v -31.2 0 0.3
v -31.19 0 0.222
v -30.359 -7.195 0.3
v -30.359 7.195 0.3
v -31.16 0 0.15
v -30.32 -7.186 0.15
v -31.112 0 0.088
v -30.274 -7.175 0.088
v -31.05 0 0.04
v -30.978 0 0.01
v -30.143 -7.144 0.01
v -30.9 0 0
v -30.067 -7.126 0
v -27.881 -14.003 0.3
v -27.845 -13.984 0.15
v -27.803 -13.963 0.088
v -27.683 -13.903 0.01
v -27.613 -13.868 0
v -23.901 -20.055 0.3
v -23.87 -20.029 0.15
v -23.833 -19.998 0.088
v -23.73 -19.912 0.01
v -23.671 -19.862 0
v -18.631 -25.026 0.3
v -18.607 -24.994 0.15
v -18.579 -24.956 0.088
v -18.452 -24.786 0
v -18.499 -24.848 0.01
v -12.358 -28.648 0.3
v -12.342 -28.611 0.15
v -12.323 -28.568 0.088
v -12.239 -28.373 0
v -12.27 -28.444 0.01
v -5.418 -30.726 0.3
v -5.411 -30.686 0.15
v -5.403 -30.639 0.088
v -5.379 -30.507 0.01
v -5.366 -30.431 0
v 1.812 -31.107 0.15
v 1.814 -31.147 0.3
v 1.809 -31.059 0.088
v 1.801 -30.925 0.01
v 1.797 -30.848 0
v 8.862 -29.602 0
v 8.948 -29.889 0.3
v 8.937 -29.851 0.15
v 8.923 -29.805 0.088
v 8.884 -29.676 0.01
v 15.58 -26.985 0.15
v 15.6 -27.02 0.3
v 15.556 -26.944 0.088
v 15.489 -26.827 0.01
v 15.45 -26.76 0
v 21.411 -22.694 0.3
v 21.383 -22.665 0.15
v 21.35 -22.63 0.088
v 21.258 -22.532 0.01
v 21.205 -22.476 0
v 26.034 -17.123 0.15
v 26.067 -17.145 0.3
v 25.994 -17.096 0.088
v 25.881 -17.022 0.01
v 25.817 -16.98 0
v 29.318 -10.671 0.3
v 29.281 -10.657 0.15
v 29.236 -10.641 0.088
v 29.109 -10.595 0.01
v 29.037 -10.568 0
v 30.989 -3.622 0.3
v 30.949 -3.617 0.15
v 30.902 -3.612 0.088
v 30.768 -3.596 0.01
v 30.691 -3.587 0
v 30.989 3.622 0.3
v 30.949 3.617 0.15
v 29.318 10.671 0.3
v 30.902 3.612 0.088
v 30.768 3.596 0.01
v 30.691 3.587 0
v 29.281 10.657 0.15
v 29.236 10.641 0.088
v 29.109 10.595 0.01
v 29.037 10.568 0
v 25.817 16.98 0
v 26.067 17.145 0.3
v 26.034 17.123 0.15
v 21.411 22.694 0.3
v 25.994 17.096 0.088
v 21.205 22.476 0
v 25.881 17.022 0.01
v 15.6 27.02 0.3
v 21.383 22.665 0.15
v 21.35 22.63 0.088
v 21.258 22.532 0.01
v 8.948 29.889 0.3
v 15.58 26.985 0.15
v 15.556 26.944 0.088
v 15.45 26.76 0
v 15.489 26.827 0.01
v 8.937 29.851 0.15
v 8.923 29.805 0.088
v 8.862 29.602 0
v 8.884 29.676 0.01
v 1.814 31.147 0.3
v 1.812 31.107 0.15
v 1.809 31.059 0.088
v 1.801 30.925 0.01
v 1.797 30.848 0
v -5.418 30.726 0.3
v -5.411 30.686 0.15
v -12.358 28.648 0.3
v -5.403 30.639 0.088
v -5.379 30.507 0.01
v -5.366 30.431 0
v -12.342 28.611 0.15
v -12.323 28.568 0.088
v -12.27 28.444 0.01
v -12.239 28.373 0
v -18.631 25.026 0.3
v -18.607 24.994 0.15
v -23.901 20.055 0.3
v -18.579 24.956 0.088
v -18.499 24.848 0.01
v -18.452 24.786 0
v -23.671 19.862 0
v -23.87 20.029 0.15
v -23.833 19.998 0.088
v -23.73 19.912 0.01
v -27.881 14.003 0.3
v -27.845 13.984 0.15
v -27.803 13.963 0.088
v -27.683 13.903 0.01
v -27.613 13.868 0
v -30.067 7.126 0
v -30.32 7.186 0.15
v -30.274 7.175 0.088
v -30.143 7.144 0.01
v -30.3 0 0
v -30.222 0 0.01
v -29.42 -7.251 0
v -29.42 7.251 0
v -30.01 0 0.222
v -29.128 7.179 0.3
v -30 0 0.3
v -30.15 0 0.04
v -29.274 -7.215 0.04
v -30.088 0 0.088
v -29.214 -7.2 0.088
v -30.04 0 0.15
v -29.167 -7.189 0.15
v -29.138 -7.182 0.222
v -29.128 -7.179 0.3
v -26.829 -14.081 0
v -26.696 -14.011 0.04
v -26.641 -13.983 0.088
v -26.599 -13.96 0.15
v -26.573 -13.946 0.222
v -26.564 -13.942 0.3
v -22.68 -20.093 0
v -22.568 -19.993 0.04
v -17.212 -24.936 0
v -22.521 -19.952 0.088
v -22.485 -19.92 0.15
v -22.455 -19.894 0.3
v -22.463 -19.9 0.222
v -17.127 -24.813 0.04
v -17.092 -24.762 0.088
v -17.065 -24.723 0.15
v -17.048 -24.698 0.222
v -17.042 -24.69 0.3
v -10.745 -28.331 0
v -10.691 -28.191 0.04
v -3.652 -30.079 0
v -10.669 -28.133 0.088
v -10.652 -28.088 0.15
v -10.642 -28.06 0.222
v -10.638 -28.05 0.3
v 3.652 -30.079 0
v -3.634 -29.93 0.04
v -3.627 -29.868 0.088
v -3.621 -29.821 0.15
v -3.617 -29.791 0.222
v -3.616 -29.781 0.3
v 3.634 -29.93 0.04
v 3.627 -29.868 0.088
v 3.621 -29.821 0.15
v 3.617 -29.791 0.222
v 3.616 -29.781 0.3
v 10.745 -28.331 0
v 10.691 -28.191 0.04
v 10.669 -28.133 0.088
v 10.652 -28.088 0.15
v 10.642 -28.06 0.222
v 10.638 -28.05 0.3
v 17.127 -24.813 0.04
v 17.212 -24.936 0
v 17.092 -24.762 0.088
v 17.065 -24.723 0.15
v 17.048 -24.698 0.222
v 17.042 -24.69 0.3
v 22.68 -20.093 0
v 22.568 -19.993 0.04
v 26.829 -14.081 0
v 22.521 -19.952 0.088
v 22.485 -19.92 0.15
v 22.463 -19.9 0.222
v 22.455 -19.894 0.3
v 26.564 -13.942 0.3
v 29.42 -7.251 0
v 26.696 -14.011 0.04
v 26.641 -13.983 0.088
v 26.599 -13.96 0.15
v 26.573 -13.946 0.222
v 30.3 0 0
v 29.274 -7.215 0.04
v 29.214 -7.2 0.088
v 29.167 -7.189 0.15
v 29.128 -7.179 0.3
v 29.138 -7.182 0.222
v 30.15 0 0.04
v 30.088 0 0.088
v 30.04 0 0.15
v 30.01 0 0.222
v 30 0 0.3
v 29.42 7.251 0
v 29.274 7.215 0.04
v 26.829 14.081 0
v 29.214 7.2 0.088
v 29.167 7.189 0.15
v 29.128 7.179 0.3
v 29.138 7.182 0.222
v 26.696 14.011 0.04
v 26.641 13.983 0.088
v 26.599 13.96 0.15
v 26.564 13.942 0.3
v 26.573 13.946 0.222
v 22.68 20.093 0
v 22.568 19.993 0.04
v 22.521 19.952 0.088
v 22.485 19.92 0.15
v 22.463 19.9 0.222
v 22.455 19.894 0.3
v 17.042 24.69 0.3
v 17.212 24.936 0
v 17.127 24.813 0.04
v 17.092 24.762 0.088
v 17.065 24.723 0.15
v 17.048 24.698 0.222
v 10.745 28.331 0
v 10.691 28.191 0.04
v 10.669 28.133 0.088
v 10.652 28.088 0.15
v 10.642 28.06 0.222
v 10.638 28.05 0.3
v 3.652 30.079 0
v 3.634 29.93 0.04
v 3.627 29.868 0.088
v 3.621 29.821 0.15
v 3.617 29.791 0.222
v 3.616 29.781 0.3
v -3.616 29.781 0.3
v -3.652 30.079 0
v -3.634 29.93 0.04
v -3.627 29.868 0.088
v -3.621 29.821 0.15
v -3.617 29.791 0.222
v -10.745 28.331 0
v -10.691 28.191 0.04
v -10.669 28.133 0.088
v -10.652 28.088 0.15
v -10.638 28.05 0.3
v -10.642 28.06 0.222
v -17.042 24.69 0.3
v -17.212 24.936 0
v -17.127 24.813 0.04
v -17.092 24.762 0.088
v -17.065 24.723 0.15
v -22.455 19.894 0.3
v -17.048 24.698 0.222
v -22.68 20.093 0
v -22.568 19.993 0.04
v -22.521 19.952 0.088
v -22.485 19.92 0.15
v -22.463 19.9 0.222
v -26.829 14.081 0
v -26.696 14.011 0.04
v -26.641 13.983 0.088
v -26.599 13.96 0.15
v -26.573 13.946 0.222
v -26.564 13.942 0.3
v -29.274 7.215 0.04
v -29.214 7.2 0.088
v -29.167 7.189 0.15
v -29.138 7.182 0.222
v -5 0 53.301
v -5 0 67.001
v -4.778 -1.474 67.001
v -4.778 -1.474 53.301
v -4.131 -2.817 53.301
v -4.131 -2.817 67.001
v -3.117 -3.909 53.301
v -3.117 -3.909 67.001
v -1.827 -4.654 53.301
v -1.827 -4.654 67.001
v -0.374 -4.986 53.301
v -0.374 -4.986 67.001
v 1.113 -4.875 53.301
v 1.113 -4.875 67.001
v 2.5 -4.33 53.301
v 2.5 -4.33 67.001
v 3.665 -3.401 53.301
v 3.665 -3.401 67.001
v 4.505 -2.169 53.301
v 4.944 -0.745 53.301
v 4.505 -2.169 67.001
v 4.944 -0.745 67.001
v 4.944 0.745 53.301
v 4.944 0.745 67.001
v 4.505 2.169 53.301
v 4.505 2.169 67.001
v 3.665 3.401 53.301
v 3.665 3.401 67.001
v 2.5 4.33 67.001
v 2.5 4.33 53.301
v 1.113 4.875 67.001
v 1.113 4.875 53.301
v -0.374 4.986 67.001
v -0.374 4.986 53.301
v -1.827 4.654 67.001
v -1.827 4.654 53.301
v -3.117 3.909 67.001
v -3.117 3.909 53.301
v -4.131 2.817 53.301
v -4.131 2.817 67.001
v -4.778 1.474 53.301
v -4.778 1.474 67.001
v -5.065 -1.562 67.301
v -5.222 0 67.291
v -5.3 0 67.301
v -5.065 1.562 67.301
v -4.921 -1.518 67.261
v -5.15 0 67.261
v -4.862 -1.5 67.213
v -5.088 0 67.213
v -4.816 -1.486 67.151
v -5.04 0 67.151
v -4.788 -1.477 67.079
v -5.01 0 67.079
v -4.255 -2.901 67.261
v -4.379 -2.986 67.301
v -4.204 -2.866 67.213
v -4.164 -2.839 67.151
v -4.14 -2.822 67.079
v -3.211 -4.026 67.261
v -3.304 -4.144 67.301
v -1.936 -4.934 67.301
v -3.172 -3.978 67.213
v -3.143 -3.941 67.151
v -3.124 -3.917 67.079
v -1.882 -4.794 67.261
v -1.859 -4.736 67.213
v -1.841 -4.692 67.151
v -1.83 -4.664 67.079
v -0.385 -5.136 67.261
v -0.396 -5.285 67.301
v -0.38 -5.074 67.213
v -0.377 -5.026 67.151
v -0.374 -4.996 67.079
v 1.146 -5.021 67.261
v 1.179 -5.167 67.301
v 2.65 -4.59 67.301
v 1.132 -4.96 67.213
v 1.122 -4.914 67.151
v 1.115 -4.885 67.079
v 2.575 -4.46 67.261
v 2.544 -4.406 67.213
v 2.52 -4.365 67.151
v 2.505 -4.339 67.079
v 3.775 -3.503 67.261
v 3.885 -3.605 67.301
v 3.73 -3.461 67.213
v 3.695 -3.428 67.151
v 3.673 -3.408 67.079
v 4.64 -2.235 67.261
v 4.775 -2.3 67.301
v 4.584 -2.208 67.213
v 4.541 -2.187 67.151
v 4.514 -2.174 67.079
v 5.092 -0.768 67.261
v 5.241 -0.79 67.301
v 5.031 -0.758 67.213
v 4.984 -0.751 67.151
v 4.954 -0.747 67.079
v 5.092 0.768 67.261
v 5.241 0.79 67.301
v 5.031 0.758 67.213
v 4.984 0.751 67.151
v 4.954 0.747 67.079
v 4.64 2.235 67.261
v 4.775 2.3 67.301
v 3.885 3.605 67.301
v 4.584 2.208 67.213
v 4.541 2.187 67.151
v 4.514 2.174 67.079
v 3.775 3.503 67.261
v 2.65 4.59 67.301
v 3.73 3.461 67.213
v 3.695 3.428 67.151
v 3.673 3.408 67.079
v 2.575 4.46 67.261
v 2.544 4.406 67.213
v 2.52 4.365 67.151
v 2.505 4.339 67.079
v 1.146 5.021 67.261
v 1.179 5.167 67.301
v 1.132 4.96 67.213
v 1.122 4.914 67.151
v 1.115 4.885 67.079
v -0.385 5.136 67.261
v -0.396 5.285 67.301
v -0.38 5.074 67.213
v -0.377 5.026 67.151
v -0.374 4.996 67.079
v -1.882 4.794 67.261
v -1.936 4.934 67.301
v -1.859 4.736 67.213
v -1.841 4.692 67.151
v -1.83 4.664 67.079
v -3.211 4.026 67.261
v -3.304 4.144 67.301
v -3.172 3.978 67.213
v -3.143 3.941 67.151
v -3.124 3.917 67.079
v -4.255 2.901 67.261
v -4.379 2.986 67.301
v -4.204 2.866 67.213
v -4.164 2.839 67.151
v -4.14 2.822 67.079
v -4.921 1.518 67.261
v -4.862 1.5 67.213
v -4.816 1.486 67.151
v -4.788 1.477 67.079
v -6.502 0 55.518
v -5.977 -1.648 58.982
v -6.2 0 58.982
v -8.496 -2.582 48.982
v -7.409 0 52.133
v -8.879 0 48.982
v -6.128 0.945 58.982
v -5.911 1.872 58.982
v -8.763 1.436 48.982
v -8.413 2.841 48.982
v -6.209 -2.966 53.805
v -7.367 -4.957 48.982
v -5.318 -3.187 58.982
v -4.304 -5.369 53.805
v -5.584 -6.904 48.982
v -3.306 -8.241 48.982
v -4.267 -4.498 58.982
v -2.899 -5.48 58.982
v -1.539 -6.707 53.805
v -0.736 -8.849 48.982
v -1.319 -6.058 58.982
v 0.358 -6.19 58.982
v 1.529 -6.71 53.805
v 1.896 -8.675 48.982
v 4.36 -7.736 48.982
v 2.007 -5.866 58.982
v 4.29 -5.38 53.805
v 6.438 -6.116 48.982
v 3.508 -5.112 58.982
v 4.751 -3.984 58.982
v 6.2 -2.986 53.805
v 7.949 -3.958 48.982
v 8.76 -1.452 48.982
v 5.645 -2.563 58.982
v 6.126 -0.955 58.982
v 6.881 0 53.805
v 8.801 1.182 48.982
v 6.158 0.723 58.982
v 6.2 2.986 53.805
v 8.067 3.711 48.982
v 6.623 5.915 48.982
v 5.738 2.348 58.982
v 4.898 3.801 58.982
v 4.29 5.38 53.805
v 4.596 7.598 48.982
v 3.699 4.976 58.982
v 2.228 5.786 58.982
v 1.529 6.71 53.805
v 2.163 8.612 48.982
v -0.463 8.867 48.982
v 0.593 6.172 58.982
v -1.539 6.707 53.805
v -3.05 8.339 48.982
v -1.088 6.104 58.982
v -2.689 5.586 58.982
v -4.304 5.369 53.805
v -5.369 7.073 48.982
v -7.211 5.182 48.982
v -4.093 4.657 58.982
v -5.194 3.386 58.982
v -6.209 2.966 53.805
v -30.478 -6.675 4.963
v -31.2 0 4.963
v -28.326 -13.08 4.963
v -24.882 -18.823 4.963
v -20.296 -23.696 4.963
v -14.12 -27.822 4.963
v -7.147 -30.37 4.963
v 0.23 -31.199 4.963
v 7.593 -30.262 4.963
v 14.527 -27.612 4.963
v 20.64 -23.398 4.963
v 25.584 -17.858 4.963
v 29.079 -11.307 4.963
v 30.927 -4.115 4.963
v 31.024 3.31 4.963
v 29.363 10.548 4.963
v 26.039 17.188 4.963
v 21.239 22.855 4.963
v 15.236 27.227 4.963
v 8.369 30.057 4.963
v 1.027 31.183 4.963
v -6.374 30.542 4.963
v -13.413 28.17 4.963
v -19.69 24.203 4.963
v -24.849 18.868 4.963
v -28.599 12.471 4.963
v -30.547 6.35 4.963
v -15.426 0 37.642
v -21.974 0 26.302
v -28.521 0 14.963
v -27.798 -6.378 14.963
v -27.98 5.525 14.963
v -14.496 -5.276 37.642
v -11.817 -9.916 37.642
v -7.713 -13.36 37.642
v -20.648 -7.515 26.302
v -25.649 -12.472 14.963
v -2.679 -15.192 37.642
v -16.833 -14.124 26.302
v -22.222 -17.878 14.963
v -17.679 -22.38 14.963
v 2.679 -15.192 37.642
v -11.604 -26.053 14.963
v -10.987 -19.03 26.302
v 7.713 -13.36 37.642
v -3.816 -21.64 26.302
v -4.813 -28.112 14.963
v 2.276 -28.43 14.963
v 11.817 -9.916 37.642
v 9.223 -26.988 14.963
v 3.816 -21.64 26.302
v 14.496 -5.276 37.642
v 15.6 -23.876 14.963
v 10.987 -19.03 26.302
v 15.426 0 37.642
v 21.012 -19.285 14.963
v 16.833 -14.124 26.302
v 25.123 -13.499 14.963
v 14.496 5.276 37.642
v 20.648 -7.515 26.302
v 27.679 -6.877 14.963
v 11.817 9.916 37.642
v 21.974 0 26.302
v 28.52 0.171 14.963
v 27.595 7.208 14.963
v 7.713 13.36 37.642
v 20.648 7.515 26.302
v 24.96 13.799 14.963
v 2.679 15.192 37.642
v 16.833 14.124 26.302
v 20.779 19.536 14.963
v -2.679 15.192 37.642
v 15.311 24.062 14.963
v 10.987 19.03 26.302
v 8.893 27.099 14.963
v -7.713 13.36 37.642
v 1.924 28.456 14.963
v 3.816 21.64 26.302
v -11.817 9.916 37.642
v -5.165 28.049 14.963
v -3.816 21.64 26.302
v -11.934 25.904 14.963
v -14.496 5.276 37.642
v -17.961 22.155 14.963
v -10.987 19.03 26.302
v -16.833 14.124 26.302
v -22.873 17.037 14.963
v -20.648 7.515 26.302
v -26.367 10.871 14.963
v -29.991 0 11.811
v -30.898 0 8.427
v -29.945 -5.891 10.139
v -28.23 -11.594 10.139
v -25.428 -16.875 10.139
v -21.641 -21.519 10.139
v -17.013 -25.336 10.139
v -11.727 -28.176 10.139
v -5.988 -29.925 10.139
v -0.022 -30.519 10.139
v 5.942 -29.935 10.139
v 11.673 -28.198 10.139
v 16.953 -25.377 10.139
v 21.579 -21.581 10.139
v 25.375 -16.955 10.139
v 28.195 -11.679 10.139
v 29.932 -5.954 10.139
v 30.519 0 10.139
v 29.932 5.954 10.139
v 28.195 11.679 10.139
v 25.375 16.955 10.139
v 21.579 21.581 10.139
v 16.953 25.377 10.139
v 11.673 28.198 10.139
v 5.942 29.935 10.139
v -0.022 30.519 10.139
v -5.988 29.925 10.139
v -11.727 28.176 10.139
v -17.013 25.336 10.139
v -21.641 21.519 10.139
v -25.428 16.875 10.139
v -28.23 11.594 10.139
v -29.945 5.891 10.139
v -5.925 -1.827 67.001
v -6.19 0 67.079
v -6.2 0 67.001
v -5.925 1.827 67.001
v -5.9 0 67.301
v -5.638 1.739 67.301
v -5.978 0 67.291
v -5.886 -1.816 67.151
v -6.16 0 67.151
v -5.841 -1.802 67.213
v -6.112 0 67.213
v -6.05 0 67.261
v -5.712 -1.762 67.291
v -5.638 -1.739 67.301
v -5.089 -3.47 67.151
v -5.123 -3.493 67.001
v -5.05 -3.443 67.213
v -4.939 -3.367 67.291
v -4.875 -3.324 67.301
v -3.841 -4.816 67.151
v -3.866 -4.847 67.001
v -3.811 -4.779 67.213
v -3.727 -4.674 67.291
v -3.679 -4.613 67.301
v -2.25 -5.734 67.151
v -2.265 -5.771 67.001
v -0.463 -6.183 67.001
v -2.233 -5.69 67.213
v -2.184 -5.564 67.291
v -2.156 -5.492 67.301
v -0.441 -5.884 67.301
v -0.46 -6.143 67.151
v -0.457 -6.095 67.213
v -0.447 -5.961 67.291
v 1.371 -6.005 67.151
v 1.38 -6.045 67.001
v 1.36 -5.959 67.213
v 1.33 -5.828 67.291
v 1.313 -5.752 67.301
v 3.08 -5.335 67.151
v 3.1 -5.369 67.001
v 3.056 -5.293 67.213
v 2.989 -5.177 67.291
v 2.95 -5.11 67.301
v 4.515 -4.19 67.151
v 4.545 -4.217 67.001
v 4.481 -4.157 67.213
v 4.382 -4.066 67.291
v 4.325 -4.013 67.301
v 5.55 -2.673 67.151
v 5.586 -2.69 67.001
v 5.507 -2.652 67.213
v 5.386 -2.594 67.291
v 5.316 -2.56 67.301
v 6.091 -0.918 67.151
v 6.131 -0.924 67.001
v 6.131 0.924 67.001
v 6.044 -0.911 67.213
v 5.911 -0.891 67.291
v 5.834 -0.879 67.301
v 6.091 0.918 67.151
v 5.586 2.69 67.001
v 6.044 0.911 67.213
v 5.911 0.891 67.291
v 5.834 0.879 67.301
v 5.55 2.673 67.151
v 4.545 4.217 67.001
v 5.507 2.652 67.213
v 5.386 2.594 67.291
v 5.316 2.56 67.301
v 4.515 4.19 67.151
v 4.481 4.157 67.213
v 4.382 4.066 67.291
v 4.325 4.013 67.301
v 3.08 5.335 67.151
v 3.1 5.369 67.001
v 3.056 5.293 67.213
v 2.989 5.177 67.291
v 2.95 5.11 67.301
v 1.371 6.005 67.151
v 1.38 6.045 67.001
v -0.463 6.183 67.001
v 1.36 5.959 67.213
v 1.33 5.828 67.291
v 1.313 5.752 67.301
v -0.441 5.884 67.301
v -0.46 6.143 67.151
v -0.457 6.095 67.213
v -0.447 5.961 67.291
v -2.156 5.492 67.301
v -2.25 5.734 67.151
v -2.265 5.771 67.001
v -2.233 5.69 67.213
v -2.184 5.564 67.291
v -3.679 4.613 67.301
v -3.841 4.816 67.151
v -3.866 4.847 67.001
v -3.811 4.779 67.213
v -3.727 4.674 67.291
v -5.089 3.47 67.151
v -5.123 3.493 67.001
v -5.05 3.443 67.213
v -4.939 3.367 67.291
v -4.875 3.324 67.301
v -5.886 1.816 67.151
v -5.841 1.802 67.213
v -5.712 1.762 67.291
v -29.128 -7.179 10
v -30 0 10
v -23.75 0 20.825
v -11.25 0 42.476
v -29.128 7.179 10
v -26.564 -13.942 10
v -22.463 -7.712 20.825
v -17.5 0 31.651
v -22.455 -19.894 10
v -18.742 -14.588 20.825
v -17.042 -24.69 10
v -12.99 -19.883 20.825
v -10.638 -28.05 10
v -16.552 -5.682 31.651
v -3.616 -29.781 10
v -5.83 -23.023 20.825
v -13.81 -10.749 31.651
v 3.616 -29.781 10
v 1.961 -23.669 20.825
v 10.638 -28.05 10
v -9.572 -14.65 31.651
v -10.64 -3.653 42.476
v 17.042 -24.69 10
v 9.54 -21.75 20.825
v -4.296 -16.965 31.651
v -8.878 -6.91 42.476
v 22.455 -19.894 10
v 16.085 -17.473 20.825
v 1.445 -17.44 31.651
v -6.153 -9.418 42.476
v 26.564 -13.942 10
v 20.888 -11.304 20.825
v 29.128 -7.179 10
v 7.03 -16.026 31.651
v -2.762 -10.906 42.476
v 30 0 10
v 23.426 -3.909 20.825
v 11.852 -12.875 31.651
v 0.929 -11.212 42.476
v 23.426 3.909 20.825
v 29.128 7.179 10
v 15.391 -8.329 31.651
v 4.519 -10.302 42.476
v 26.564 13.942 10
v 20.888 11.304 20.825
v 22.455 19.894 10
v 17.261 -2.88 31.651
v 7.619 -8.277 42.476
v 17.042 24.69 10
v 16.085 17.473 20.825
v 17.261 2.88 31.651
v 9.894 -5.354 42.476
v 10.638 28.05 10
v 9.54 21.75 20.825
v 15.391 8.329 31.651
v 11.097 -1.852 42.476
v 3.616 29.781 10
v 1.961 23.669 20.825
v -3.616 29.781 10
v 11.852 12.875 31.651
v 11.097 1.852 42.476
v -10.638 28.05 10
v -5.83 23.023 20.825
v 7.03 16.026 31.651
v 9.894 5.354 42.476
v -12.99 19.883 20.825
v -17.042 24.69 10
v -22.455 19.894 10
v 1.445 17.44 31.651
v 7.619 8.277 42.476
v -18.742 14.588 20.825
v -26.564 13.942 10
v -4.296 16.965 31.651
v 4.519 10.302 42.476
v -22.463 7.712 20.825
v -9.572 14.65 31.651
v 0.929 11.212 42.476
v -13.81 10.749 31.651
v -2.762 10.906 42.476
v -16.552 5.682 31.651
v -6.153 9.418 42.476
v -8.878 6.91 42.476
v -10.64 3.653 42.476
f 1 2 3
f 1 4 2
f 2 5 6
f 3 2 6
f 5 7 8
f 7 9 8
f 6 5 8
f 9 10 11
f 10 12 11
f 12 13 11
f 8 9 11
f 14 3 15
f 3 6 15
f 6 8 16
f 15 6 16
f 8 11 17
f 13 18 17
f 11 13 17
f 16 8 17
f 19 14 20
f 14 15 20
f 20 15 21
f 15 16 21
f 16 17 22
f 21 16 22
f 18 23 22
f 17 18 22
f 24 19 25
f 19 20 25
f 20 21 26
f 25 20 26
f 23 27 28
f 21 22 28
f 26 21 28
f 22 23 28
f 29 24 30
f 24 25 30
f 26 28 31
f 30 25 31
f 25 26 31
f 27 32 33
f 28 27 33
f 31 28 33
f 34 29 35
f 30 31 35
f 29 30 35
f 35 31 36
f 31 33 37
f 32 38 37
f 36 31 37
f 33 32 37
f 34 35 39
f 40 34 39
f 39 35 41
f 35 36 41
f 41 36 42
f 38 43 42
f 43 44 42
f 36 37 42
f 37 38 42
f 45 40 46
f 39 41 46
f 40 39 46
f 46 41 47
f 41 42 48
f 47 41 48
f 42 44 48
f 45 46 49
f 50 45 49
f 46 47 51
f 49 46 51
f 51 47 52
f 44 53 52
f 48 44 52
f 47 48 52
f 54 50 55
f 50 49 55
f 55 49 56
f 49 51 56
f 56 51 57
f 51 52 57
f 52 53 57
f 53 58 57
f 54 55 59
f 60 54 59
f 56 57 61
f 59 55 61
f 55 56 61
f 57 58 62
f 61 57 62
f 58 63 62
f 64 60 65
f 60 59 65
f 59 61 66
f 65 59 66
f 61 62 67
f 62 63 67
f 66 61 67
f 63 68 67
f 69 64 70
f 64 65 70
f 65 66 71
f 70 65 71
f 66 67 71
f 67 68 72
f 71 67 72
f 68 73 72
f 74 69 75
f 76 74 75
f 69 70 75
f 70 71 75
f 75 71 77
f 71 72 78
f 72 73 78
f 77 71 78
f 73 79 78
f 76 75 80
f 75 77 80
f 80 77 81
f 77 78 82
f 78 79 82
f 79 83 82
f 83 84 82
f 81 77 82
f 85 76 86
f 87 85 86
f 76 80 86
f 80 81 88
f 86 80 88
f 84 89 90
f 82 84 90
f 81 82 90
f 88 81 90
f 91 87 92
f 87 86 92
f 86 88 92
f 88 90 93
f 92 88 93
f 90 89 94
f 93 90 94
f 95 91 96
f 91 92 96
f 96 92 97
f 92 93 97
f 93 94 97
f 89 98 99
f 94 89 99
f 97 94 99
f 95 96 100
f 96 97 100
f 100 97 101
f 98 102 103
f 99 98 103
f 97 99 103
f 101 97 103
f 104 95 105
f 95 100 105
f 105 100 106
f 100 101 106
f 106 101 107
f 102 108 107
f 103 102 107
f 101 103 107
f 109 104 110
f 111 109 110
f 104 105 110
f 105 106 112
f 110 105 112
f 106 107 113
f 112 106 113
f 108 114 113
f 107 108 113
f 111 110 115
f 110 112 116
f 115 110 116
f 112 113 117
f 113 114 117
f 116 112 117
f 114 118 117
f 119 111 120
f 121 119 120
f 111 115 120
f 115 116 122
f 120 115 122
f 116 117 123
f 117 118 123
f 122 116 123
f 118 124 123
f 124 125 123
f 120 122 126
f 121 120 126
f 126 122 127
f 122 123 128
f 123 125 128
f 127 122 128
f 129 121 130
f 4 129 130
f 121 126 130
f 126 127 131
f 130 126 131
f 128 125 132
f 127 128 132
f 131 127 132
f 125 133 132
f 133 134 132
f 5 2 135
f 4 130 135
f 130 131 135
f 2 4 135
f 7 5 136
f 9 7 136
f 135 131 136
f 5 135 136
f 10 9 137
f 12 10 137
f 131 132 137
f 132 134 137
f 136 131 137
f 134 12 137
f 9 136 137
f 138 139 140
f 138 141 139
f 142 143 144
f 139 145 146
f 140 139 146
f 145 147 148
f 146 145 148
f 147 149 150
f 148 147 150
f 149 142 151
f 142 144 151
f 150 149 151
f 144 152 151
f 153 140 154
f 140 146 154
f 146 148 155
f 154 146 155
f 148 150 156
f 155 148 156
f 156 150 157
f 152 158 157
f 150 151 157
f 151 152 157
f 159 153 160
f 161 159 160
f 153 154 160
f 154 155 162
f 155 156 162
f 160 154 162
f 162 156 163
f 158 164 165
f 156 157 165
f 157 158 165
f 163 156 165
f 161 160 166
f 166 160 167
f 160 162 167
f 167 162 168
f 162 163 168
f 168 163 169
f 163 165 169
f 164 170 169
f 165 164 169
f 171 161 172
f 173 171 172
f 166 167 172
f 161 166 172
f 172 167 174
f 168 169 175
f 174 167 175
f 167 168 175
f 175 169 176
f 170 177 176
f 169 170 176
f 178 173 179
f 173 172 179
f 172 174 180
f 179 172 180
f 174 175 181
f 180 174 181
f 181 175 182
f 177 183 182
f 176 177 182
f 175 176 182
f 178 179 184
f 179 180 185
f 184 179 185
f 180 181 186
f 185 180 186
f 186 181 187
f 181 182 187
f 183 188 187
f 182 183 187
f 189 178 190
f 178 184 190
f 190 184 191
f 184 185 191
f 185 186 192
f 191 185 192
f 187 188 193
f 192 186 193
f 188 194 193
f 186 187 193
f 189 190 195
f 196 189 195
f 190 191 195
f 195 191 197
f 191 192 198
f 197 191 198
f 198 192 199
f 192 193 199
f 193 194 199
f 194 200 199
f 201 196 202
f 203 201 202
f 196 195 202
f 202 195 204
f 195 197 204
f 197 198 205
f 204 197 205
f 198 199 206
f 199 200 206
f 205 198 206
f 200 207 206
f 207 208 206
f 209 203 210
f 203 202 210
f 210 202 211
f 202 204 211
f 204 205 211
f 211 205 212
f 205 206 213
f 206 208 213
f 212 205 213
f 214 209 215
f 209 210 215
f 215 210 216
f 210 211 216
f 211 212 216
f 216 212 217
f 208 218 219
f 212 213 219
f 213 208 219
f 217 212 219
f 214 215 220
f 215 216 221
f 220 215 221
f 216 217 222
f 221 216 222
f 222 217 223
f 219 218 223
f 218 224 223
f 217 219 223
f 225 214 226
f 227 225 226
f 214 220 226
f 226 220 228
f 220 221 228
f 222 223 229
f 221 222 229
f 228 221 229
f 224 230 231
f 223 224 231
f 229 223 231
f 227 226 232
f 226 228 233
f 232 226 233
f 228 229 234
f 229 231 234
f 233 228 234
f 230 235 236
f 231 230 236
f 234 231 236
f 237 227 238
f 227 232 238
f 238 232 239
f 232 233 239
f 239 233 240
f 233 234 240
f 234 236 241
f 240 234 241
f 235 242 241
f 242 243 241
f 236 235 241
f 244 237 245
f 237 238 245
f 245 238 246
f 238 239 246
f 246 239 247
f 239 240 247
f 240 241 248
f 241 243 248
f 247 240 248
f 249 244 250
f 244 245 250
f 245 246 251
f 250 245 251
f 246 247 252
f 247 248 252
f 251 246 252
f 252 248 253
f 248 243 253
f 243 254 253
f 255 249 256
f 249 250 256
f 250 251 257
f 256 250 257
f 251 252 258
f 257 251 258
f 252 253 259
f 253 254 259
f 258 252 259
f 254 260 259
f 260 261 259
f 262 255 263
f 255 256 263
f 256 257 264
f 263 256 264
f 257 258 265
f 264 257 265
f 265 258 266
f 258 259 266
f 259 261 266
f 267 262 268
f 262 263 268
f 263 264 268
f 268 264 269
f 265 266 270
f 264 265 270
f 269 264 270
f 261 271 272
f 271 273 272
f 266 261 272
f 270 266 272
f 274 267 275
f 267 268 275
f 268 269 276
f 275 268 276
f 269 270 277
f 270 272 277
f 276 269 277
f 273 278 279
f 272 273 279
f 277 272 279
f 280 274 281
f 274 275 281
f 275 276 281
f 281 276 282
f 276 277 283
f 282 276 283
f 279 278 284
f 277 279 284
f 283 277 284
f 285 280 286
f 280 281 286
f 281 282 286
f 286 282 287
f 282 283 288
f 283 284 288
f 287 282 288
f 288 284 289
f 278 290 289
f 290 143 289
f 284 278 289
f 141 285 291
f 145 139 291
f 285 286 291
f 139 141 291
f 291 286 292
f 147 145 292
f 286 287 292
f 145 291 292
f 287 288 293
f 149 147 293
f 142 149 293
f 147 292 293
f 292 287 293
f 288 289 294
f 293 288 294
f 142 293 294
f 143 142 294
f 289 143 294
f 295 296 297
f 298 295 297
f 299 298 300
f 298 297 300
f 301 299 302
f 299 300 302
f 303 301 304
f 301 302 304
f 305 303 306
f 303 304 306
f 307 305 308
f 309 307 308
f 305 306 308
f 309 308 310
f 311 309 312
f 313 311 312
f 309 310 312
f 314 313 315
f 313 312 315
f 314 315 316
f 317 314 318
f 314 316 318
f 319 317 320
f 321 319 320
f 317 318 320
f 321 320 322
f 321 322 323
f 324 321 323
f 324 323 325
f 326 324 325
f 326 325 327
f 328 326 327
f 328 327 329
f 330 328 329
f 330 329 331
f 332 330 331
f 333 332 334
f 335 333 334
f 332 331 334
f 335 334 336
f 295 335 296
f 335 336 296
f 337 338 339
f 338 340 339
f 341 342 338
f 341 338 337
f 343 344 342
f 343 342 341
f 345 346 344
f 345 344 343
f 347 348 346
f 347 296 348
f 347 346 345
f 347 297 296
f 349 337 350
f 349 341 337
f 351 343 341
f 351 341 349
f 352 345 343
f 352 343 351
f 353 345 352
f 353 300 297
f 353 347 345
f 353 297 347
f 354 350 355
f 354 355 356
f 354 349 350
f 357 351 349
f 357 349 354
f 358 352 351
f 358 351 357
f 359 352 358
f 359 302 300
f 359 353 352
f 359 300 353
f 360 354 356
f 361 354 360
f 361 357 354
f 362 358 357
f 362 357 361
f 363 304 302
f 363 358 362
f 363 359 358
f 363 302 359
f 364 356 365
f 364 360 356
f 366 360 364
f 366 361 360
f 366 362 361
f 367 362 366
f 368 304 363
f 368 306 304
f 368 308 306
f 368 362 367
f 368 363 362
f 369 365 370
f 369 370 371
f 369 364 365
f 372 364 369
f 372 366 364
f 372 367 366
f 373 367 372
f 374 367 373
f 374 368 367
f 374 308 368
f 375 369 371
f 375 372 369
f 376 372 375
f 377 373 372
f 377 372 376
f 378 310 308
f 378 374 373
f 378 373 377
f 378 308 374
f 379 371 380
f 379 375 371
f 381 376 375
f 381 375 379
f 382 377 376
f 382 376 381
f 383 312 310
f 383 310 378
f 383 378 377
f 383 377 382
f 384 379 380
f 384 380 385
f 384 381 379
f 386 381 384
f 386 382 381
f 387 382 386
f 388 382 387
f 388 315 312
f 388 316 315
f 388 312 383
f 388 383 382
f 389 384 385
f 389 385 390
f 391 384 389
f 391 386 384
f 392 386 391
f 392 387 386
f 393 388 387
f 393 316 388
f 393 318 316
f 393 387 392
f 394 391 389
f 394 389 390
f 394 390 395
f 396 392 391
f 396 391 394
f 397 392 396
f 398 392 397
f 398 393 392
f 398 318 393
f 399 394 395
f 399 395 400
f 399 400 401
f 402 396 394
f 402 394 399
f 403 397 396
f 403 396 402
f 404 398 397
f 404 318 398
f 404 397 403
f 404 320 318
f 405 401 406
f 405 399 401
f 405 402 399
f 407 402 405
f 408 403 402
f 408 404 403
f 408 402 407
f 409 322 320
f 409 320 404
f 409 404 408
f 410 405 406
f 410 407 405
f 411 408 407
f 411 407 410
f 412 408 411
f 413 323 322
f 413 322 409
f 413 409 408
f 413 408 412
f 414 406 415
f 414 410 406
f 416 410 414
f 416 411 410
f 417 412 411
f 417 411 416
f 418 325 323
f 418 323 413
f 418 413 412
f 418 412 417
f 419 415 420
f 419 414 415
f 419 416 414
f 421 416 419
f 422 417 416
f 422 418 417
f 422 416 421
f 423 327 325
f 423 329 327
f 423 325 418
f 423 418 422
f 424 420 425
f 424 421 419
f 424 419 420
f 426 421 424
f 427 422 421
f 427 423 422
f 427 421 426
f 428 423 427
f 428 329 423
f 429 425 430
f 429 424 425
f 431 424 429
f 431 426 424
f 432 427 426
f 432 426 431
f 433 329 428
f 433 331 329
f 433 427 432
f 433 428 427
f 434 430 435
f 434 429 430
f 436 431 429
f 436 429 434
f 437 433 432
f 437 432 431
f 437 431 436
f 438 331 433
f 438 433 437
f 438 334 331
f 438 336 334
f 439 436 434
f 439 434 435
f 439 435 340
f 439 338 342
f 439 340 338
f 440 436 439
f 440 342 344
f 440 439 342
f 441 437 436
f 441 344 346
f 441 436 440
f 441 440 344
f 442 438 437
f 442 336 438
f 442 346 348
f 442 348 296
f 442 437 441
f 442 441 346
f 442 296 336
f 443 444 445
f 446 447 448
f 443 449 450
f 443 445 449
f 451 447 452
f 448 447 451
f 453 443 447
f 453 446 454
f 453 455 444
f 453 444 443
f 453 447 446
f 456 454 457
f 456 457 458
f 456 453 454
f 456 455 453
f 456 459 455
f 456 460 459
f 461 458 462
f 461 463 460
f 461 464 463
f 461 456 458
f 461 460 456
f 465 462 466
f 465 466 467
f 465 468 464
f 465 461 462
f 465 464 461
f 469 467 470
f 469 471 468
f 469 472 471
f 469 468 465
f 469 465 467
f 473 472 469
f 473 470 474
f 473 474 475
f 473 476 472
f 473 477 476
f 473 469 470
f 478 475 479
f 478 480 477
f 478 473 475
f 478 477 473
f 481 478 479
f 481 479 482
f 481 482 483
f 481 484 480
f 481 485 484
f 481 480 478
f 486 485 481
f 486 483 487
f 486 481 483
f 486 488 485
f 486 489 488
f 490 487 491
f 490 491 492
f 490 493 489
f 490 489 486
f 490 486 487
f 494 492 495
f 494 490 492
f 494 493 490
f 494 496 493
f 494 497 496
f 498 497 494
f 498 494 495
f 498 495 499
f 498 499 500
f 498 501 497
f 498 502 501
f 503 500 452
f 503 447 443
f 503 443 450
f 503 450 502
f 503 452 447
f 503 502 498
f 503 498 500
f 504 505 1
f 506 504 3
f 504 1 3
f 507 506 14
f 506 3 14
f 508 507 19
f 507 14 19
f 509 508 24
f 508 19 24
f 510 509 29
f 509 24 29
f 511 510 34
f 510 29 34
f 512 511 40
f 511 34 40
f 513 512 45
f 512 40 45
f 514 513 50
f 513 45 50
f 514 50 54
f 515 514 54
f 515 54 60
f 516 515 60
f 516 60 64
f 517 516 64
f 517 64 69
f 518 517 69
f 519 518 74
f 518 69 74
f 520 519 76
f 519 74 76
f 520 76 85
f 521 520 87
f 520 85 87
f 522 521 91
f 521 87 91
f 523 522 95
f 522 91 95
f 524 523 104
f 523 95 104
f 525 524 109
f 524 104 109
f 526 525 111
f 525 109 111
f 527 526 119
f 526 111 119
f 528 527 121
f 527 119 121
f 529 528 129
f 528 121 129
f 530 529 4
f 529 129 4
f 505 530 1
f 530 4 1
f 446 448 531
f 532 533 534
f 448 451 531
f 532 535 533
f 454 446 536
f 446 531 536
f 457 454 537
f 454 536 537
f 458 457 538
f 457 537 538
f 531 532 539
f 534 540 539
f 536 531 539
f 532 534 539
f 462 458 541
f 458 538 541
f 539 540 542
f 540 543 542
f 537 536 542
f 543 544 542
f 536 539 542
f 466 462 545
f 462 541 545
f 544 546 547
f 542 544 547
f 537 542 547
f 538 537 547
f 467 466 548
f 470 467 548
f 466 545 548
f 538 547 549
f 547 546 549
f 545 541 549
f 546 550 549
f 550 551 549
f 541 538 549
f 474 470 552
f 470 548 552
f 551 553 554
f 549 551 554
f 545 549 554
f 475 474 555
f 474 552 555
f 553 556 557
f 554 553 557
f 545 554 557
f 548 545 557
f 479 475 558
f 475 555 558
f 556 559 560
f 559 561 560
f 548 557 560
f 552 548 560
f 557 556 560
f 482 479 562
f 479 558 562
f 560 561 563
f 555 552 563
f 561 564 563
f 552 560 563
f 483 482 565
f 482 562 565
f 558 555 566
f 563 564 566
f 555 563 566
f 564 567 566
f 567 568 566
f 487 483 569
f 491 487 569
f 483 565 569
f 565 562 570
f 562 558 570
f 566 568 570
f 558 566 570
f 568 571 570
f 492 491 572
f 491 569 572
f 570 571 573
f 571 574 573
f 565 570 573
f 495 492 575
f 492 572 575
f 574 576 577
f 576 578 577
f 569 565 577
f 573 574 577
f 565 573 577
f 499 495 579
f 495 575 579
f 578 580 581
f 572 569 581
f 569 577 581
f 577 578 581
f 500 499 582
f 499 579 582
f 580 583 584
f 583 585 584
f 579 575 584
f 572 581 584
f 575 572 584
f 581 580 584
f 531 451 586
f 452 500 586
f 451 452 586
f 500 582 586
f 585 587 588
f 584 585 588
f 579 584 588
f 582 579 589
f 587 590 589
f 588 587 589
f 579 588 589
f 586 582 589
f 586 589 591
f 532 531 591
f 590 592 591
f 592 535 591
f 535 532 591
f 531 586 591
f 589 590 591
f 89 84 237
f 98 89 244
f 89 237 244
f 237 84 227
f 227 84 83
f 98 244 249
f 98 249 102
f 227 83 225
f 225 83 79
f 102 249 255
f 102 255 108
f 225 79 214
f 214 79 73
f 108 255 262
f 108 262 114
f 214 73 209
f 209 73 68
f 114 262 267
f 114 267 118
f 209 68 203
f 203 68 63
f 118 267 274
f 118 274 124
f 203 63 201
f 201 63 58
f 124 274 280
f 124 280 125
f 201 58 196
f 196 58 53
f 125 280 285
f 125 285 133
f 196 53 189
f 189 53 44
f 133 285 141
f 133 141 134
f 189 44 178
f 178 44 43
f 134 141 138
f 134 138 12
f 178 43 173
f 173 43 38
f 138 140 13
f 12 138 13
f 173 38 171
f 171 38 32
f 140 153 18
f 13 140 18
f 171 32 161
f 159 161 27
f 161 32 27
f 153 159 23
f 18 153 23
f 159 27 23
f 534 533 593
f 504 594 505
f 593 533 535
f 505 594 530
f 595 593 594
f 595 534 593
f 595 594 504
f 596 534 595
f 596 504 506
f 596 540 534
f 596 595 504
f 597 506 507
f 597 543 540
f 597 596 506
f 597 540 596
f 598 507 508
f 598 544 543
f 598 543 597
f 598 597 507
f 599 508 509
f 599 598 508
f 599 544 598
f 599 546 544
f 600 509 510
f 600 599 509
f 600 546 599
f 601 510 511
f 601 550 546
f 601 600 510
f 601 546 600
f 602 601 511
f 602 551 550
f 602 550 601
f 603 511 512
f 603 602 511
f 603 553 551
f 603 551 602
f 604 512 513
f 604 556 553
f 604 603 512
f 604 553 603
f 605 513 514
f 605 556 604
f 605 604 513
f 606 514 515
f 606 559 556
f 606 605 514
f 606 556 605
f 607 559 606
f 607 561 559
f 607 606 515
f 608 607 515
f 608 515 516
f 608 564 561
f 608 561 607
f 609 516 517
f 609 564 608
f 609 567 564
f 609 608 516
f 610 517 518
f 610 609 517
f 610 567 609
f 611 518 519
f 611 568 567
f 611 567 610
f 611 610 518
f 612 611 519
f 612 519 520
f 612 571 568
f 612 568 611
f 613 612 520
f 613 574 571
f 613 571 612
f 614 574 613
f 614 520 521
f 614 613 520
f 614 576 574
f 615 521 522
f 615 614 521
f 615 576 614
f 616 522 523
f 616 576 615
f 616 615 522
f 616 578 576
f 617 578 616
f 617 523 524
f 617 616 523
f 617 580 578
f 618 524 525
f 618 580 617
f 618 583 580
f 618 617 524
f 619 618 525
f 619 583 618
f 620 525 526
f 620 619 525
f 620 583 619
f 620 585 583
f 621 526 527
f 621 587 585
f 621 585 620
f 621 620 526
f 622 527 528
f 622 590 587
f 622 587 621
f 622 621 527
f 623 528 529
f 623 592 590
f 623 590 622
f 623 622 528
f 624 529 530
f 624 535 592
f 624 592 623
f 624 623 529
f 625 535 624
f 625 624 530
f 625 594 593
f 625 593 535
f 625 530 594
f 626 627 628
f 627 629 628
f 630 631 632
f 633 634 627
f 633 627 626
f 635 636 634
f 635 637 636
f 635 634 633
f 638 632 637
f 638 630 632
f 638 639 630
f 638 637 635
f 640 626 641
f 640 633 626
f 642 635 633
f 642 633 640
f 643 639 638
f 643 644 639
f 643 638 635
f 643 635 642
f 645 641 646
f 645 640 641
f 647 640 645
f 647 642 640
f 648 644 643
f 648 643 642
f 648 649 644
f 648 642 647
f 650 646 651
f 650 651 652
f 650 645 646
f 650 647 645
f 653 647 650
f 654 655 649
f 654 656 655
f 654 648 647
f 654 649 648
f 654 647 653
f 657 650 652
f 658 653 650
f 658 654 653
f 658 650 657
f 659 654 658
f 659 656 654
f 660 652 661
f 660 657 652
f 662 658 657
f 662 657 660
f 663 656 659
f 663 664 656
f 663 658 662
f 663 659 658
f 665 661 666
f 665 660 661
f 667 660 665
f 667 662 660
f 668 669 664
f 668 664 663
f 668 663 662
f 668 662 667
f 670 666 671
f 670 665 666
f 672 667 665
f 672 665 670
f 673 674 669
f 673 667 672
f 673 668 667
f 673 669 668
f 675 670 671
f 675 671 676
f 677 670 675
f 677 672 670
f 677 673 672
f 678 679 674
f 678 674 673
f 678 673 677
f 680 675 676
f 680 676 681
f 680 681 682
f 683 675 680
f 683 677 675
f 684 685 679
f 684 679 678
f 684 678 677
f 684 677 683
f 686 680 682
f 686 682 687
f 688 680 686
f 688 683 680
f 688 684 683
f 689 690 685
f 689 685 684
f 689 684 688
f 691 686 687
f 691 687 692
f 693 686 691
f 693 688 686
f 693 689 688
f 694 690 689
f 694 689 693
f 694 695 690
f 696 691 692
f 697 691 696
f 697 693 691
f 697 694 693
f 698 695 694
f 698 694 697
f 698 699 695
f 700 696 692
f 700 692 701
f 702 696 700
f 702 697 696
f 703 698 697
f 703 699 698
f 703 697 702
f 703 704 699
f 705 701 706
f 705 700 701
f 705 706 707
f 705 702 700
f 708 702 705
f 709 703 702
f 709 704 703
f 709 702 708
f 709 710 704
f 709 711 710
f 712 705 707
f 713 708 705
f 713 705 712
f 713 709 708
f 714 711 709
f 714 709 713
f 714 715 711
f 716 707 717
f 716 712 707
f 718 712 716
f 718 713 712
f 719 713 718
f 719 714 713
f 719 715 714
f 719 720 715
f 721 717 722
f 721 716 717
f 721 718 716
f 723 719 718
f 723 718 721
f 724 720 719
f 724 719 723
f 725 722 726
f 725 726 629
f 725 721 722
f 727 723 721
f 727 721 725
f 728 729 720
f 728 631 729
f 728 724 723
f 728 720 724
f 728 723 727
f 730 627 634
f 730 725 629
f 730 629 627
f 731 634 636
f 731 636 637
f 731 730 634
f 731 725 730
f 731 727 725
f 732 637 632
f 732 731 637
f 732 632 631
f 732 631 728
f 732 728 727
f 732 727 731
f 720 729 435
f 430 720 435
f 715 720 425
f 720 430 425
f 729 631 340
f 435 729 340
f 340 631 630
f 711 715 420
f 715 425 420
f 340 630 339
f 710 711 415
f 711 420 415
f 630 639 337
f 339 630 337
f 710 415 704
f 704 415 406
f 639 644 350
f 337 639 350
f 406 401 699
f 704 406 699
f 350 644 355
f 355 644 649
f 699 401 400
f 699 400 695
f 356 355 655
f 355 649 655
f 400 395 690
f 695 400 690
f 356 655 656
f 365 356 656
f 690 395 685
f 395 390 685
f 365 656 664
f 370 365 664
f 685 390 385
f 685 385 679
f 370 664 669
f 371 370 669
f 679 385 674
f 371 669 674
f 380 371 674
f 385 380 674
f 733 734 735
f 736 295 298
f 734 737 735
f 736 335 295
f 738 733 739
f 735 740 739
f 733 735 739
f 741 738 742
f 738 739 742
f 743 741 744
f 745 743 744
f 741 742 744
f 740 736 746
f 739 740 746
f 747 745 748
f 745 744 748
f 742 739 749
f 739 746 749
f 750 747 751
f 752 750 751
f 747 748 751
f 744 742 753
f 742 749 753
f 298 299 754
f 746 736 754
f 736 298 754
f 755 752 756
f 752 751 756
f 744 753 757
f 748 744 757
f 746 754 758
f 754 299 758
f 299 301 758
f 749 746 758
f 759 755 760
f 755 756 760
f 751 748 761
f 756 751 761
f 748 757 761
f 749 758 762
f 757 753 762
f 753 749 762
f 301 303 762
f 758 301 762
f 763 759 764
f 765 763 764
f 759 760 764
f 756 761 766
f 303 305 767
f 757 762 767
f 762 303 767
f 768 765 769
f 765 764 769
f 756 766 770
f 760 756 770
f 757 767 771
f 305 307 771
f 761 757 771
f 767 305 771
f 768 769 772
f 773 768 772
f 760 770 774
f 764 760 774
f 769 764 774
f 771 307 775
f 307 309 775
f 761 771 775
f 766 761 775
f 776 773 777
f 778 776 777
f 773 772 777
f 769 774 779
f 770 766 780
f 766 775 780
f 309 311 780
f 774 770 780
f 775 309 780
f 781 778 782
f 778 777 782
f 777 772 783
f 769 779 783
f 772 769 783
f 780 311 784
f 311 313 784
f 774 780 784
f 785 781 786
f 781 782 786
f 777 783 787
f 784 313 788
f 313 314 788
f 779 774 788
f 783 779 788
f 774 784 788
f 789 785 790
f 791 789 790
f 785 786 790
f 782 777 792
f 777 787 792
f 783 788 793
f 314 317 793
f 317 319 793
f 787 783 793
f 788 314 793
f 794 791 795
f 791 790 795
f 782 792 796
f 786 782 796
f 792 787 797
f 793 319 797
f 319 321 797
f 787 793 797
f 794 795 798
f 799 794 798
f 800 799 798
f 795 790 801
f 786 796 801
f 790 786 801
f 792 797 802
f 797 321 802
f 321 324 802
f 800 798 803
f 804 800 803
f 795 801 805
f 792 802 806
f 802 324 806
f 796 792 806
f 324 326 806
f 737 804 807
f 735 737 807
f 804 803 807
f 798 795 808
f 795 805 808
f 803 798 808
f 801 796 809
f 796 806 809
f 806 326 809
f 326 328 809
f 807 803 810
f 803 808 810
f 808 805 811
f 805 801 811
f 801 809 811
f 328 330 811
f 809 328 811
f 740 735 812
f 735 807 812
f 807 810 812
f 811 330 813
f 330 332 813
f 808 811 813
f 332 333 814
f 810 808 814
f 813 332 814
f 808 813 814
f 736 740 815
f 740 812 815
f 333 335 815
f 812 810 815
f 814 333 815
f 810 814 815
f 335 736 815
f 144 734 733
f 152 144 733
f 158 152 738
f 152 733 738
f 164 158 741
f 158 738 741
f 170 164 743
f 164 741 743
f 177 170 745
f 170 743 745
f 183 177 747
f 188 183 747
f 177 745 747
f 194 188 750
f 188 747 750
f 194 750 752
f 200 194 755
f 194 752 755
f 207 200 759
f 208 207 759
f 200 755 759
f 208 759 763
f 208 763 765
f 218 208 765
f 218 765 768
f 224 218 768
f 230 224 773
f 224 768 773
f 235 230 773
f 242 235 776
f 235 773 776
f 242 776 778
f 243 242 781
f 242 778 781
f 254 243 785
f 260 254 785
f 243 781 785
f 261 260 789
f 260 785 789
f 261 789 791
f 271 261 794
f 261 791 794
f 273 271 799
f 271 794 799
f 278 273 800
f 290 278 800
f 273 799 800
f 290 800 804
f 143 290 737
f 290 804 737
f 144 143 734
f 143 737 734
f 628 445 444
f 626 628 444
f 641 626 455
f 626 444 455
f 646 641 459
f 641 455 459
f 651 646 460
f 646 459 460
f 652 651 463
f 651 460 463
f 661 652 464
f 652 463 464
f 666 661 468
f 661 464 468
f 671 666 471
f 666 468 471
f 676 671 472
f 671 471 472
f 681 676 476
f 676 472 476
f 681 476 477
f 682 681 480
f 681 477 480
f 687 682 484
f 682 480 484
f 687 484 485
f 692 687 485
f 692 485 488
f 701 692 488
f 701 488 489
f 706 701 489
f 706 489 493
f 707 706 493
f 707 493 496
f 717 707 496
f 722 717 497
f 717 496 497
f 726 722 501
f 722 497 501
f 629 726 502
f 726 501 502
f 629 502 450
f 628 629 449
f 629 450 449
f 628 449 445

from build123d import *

# Parameters (mm, degrees)
F2_R = 20
F3_R = 0.3
F4_R = 0.3


with BuildPart() as f1:
    # F0 (on Front) → F1 (revolve)
    with BuildSketch(Plane.XZ):
        Polygon((-31.2, 0), (-30, 0), (-30, 10), (-5, 53.30127), (-5, 67.30127), (-6.2, 67.30127), (-6.2, 53.622809), (-31.2, 10.321539), align=None)
    revolve(axis=Axis((0, 0, 8.207551), (0, 0, 1)))

    # F2
    f2_edges = [f1.edges().sort_by_distance(p)[0] for p in [
        (31.2, 0, 10.321539),
        (6.2, 0, 53.622809),
    ]]
    fillet(f2_edges, radius=F2_R)

    # F3
    f3_edges = [f1.edges().sort_by_distance(p)[0] for p in [
        (5, 0, 67.30127),
        (6.2, 0, 67.30127),
    ]]
    fillet(f3_edges, radius=F3_R)

    # F4
    f4_edges = [f1.edges().sort_by_distance(p)[0] for p in [
        (31.2, 0, 0),
        (30, 0, 0),
    ]]
    fillet(f4_edges, radius=F4_R)


solid = f1.part
